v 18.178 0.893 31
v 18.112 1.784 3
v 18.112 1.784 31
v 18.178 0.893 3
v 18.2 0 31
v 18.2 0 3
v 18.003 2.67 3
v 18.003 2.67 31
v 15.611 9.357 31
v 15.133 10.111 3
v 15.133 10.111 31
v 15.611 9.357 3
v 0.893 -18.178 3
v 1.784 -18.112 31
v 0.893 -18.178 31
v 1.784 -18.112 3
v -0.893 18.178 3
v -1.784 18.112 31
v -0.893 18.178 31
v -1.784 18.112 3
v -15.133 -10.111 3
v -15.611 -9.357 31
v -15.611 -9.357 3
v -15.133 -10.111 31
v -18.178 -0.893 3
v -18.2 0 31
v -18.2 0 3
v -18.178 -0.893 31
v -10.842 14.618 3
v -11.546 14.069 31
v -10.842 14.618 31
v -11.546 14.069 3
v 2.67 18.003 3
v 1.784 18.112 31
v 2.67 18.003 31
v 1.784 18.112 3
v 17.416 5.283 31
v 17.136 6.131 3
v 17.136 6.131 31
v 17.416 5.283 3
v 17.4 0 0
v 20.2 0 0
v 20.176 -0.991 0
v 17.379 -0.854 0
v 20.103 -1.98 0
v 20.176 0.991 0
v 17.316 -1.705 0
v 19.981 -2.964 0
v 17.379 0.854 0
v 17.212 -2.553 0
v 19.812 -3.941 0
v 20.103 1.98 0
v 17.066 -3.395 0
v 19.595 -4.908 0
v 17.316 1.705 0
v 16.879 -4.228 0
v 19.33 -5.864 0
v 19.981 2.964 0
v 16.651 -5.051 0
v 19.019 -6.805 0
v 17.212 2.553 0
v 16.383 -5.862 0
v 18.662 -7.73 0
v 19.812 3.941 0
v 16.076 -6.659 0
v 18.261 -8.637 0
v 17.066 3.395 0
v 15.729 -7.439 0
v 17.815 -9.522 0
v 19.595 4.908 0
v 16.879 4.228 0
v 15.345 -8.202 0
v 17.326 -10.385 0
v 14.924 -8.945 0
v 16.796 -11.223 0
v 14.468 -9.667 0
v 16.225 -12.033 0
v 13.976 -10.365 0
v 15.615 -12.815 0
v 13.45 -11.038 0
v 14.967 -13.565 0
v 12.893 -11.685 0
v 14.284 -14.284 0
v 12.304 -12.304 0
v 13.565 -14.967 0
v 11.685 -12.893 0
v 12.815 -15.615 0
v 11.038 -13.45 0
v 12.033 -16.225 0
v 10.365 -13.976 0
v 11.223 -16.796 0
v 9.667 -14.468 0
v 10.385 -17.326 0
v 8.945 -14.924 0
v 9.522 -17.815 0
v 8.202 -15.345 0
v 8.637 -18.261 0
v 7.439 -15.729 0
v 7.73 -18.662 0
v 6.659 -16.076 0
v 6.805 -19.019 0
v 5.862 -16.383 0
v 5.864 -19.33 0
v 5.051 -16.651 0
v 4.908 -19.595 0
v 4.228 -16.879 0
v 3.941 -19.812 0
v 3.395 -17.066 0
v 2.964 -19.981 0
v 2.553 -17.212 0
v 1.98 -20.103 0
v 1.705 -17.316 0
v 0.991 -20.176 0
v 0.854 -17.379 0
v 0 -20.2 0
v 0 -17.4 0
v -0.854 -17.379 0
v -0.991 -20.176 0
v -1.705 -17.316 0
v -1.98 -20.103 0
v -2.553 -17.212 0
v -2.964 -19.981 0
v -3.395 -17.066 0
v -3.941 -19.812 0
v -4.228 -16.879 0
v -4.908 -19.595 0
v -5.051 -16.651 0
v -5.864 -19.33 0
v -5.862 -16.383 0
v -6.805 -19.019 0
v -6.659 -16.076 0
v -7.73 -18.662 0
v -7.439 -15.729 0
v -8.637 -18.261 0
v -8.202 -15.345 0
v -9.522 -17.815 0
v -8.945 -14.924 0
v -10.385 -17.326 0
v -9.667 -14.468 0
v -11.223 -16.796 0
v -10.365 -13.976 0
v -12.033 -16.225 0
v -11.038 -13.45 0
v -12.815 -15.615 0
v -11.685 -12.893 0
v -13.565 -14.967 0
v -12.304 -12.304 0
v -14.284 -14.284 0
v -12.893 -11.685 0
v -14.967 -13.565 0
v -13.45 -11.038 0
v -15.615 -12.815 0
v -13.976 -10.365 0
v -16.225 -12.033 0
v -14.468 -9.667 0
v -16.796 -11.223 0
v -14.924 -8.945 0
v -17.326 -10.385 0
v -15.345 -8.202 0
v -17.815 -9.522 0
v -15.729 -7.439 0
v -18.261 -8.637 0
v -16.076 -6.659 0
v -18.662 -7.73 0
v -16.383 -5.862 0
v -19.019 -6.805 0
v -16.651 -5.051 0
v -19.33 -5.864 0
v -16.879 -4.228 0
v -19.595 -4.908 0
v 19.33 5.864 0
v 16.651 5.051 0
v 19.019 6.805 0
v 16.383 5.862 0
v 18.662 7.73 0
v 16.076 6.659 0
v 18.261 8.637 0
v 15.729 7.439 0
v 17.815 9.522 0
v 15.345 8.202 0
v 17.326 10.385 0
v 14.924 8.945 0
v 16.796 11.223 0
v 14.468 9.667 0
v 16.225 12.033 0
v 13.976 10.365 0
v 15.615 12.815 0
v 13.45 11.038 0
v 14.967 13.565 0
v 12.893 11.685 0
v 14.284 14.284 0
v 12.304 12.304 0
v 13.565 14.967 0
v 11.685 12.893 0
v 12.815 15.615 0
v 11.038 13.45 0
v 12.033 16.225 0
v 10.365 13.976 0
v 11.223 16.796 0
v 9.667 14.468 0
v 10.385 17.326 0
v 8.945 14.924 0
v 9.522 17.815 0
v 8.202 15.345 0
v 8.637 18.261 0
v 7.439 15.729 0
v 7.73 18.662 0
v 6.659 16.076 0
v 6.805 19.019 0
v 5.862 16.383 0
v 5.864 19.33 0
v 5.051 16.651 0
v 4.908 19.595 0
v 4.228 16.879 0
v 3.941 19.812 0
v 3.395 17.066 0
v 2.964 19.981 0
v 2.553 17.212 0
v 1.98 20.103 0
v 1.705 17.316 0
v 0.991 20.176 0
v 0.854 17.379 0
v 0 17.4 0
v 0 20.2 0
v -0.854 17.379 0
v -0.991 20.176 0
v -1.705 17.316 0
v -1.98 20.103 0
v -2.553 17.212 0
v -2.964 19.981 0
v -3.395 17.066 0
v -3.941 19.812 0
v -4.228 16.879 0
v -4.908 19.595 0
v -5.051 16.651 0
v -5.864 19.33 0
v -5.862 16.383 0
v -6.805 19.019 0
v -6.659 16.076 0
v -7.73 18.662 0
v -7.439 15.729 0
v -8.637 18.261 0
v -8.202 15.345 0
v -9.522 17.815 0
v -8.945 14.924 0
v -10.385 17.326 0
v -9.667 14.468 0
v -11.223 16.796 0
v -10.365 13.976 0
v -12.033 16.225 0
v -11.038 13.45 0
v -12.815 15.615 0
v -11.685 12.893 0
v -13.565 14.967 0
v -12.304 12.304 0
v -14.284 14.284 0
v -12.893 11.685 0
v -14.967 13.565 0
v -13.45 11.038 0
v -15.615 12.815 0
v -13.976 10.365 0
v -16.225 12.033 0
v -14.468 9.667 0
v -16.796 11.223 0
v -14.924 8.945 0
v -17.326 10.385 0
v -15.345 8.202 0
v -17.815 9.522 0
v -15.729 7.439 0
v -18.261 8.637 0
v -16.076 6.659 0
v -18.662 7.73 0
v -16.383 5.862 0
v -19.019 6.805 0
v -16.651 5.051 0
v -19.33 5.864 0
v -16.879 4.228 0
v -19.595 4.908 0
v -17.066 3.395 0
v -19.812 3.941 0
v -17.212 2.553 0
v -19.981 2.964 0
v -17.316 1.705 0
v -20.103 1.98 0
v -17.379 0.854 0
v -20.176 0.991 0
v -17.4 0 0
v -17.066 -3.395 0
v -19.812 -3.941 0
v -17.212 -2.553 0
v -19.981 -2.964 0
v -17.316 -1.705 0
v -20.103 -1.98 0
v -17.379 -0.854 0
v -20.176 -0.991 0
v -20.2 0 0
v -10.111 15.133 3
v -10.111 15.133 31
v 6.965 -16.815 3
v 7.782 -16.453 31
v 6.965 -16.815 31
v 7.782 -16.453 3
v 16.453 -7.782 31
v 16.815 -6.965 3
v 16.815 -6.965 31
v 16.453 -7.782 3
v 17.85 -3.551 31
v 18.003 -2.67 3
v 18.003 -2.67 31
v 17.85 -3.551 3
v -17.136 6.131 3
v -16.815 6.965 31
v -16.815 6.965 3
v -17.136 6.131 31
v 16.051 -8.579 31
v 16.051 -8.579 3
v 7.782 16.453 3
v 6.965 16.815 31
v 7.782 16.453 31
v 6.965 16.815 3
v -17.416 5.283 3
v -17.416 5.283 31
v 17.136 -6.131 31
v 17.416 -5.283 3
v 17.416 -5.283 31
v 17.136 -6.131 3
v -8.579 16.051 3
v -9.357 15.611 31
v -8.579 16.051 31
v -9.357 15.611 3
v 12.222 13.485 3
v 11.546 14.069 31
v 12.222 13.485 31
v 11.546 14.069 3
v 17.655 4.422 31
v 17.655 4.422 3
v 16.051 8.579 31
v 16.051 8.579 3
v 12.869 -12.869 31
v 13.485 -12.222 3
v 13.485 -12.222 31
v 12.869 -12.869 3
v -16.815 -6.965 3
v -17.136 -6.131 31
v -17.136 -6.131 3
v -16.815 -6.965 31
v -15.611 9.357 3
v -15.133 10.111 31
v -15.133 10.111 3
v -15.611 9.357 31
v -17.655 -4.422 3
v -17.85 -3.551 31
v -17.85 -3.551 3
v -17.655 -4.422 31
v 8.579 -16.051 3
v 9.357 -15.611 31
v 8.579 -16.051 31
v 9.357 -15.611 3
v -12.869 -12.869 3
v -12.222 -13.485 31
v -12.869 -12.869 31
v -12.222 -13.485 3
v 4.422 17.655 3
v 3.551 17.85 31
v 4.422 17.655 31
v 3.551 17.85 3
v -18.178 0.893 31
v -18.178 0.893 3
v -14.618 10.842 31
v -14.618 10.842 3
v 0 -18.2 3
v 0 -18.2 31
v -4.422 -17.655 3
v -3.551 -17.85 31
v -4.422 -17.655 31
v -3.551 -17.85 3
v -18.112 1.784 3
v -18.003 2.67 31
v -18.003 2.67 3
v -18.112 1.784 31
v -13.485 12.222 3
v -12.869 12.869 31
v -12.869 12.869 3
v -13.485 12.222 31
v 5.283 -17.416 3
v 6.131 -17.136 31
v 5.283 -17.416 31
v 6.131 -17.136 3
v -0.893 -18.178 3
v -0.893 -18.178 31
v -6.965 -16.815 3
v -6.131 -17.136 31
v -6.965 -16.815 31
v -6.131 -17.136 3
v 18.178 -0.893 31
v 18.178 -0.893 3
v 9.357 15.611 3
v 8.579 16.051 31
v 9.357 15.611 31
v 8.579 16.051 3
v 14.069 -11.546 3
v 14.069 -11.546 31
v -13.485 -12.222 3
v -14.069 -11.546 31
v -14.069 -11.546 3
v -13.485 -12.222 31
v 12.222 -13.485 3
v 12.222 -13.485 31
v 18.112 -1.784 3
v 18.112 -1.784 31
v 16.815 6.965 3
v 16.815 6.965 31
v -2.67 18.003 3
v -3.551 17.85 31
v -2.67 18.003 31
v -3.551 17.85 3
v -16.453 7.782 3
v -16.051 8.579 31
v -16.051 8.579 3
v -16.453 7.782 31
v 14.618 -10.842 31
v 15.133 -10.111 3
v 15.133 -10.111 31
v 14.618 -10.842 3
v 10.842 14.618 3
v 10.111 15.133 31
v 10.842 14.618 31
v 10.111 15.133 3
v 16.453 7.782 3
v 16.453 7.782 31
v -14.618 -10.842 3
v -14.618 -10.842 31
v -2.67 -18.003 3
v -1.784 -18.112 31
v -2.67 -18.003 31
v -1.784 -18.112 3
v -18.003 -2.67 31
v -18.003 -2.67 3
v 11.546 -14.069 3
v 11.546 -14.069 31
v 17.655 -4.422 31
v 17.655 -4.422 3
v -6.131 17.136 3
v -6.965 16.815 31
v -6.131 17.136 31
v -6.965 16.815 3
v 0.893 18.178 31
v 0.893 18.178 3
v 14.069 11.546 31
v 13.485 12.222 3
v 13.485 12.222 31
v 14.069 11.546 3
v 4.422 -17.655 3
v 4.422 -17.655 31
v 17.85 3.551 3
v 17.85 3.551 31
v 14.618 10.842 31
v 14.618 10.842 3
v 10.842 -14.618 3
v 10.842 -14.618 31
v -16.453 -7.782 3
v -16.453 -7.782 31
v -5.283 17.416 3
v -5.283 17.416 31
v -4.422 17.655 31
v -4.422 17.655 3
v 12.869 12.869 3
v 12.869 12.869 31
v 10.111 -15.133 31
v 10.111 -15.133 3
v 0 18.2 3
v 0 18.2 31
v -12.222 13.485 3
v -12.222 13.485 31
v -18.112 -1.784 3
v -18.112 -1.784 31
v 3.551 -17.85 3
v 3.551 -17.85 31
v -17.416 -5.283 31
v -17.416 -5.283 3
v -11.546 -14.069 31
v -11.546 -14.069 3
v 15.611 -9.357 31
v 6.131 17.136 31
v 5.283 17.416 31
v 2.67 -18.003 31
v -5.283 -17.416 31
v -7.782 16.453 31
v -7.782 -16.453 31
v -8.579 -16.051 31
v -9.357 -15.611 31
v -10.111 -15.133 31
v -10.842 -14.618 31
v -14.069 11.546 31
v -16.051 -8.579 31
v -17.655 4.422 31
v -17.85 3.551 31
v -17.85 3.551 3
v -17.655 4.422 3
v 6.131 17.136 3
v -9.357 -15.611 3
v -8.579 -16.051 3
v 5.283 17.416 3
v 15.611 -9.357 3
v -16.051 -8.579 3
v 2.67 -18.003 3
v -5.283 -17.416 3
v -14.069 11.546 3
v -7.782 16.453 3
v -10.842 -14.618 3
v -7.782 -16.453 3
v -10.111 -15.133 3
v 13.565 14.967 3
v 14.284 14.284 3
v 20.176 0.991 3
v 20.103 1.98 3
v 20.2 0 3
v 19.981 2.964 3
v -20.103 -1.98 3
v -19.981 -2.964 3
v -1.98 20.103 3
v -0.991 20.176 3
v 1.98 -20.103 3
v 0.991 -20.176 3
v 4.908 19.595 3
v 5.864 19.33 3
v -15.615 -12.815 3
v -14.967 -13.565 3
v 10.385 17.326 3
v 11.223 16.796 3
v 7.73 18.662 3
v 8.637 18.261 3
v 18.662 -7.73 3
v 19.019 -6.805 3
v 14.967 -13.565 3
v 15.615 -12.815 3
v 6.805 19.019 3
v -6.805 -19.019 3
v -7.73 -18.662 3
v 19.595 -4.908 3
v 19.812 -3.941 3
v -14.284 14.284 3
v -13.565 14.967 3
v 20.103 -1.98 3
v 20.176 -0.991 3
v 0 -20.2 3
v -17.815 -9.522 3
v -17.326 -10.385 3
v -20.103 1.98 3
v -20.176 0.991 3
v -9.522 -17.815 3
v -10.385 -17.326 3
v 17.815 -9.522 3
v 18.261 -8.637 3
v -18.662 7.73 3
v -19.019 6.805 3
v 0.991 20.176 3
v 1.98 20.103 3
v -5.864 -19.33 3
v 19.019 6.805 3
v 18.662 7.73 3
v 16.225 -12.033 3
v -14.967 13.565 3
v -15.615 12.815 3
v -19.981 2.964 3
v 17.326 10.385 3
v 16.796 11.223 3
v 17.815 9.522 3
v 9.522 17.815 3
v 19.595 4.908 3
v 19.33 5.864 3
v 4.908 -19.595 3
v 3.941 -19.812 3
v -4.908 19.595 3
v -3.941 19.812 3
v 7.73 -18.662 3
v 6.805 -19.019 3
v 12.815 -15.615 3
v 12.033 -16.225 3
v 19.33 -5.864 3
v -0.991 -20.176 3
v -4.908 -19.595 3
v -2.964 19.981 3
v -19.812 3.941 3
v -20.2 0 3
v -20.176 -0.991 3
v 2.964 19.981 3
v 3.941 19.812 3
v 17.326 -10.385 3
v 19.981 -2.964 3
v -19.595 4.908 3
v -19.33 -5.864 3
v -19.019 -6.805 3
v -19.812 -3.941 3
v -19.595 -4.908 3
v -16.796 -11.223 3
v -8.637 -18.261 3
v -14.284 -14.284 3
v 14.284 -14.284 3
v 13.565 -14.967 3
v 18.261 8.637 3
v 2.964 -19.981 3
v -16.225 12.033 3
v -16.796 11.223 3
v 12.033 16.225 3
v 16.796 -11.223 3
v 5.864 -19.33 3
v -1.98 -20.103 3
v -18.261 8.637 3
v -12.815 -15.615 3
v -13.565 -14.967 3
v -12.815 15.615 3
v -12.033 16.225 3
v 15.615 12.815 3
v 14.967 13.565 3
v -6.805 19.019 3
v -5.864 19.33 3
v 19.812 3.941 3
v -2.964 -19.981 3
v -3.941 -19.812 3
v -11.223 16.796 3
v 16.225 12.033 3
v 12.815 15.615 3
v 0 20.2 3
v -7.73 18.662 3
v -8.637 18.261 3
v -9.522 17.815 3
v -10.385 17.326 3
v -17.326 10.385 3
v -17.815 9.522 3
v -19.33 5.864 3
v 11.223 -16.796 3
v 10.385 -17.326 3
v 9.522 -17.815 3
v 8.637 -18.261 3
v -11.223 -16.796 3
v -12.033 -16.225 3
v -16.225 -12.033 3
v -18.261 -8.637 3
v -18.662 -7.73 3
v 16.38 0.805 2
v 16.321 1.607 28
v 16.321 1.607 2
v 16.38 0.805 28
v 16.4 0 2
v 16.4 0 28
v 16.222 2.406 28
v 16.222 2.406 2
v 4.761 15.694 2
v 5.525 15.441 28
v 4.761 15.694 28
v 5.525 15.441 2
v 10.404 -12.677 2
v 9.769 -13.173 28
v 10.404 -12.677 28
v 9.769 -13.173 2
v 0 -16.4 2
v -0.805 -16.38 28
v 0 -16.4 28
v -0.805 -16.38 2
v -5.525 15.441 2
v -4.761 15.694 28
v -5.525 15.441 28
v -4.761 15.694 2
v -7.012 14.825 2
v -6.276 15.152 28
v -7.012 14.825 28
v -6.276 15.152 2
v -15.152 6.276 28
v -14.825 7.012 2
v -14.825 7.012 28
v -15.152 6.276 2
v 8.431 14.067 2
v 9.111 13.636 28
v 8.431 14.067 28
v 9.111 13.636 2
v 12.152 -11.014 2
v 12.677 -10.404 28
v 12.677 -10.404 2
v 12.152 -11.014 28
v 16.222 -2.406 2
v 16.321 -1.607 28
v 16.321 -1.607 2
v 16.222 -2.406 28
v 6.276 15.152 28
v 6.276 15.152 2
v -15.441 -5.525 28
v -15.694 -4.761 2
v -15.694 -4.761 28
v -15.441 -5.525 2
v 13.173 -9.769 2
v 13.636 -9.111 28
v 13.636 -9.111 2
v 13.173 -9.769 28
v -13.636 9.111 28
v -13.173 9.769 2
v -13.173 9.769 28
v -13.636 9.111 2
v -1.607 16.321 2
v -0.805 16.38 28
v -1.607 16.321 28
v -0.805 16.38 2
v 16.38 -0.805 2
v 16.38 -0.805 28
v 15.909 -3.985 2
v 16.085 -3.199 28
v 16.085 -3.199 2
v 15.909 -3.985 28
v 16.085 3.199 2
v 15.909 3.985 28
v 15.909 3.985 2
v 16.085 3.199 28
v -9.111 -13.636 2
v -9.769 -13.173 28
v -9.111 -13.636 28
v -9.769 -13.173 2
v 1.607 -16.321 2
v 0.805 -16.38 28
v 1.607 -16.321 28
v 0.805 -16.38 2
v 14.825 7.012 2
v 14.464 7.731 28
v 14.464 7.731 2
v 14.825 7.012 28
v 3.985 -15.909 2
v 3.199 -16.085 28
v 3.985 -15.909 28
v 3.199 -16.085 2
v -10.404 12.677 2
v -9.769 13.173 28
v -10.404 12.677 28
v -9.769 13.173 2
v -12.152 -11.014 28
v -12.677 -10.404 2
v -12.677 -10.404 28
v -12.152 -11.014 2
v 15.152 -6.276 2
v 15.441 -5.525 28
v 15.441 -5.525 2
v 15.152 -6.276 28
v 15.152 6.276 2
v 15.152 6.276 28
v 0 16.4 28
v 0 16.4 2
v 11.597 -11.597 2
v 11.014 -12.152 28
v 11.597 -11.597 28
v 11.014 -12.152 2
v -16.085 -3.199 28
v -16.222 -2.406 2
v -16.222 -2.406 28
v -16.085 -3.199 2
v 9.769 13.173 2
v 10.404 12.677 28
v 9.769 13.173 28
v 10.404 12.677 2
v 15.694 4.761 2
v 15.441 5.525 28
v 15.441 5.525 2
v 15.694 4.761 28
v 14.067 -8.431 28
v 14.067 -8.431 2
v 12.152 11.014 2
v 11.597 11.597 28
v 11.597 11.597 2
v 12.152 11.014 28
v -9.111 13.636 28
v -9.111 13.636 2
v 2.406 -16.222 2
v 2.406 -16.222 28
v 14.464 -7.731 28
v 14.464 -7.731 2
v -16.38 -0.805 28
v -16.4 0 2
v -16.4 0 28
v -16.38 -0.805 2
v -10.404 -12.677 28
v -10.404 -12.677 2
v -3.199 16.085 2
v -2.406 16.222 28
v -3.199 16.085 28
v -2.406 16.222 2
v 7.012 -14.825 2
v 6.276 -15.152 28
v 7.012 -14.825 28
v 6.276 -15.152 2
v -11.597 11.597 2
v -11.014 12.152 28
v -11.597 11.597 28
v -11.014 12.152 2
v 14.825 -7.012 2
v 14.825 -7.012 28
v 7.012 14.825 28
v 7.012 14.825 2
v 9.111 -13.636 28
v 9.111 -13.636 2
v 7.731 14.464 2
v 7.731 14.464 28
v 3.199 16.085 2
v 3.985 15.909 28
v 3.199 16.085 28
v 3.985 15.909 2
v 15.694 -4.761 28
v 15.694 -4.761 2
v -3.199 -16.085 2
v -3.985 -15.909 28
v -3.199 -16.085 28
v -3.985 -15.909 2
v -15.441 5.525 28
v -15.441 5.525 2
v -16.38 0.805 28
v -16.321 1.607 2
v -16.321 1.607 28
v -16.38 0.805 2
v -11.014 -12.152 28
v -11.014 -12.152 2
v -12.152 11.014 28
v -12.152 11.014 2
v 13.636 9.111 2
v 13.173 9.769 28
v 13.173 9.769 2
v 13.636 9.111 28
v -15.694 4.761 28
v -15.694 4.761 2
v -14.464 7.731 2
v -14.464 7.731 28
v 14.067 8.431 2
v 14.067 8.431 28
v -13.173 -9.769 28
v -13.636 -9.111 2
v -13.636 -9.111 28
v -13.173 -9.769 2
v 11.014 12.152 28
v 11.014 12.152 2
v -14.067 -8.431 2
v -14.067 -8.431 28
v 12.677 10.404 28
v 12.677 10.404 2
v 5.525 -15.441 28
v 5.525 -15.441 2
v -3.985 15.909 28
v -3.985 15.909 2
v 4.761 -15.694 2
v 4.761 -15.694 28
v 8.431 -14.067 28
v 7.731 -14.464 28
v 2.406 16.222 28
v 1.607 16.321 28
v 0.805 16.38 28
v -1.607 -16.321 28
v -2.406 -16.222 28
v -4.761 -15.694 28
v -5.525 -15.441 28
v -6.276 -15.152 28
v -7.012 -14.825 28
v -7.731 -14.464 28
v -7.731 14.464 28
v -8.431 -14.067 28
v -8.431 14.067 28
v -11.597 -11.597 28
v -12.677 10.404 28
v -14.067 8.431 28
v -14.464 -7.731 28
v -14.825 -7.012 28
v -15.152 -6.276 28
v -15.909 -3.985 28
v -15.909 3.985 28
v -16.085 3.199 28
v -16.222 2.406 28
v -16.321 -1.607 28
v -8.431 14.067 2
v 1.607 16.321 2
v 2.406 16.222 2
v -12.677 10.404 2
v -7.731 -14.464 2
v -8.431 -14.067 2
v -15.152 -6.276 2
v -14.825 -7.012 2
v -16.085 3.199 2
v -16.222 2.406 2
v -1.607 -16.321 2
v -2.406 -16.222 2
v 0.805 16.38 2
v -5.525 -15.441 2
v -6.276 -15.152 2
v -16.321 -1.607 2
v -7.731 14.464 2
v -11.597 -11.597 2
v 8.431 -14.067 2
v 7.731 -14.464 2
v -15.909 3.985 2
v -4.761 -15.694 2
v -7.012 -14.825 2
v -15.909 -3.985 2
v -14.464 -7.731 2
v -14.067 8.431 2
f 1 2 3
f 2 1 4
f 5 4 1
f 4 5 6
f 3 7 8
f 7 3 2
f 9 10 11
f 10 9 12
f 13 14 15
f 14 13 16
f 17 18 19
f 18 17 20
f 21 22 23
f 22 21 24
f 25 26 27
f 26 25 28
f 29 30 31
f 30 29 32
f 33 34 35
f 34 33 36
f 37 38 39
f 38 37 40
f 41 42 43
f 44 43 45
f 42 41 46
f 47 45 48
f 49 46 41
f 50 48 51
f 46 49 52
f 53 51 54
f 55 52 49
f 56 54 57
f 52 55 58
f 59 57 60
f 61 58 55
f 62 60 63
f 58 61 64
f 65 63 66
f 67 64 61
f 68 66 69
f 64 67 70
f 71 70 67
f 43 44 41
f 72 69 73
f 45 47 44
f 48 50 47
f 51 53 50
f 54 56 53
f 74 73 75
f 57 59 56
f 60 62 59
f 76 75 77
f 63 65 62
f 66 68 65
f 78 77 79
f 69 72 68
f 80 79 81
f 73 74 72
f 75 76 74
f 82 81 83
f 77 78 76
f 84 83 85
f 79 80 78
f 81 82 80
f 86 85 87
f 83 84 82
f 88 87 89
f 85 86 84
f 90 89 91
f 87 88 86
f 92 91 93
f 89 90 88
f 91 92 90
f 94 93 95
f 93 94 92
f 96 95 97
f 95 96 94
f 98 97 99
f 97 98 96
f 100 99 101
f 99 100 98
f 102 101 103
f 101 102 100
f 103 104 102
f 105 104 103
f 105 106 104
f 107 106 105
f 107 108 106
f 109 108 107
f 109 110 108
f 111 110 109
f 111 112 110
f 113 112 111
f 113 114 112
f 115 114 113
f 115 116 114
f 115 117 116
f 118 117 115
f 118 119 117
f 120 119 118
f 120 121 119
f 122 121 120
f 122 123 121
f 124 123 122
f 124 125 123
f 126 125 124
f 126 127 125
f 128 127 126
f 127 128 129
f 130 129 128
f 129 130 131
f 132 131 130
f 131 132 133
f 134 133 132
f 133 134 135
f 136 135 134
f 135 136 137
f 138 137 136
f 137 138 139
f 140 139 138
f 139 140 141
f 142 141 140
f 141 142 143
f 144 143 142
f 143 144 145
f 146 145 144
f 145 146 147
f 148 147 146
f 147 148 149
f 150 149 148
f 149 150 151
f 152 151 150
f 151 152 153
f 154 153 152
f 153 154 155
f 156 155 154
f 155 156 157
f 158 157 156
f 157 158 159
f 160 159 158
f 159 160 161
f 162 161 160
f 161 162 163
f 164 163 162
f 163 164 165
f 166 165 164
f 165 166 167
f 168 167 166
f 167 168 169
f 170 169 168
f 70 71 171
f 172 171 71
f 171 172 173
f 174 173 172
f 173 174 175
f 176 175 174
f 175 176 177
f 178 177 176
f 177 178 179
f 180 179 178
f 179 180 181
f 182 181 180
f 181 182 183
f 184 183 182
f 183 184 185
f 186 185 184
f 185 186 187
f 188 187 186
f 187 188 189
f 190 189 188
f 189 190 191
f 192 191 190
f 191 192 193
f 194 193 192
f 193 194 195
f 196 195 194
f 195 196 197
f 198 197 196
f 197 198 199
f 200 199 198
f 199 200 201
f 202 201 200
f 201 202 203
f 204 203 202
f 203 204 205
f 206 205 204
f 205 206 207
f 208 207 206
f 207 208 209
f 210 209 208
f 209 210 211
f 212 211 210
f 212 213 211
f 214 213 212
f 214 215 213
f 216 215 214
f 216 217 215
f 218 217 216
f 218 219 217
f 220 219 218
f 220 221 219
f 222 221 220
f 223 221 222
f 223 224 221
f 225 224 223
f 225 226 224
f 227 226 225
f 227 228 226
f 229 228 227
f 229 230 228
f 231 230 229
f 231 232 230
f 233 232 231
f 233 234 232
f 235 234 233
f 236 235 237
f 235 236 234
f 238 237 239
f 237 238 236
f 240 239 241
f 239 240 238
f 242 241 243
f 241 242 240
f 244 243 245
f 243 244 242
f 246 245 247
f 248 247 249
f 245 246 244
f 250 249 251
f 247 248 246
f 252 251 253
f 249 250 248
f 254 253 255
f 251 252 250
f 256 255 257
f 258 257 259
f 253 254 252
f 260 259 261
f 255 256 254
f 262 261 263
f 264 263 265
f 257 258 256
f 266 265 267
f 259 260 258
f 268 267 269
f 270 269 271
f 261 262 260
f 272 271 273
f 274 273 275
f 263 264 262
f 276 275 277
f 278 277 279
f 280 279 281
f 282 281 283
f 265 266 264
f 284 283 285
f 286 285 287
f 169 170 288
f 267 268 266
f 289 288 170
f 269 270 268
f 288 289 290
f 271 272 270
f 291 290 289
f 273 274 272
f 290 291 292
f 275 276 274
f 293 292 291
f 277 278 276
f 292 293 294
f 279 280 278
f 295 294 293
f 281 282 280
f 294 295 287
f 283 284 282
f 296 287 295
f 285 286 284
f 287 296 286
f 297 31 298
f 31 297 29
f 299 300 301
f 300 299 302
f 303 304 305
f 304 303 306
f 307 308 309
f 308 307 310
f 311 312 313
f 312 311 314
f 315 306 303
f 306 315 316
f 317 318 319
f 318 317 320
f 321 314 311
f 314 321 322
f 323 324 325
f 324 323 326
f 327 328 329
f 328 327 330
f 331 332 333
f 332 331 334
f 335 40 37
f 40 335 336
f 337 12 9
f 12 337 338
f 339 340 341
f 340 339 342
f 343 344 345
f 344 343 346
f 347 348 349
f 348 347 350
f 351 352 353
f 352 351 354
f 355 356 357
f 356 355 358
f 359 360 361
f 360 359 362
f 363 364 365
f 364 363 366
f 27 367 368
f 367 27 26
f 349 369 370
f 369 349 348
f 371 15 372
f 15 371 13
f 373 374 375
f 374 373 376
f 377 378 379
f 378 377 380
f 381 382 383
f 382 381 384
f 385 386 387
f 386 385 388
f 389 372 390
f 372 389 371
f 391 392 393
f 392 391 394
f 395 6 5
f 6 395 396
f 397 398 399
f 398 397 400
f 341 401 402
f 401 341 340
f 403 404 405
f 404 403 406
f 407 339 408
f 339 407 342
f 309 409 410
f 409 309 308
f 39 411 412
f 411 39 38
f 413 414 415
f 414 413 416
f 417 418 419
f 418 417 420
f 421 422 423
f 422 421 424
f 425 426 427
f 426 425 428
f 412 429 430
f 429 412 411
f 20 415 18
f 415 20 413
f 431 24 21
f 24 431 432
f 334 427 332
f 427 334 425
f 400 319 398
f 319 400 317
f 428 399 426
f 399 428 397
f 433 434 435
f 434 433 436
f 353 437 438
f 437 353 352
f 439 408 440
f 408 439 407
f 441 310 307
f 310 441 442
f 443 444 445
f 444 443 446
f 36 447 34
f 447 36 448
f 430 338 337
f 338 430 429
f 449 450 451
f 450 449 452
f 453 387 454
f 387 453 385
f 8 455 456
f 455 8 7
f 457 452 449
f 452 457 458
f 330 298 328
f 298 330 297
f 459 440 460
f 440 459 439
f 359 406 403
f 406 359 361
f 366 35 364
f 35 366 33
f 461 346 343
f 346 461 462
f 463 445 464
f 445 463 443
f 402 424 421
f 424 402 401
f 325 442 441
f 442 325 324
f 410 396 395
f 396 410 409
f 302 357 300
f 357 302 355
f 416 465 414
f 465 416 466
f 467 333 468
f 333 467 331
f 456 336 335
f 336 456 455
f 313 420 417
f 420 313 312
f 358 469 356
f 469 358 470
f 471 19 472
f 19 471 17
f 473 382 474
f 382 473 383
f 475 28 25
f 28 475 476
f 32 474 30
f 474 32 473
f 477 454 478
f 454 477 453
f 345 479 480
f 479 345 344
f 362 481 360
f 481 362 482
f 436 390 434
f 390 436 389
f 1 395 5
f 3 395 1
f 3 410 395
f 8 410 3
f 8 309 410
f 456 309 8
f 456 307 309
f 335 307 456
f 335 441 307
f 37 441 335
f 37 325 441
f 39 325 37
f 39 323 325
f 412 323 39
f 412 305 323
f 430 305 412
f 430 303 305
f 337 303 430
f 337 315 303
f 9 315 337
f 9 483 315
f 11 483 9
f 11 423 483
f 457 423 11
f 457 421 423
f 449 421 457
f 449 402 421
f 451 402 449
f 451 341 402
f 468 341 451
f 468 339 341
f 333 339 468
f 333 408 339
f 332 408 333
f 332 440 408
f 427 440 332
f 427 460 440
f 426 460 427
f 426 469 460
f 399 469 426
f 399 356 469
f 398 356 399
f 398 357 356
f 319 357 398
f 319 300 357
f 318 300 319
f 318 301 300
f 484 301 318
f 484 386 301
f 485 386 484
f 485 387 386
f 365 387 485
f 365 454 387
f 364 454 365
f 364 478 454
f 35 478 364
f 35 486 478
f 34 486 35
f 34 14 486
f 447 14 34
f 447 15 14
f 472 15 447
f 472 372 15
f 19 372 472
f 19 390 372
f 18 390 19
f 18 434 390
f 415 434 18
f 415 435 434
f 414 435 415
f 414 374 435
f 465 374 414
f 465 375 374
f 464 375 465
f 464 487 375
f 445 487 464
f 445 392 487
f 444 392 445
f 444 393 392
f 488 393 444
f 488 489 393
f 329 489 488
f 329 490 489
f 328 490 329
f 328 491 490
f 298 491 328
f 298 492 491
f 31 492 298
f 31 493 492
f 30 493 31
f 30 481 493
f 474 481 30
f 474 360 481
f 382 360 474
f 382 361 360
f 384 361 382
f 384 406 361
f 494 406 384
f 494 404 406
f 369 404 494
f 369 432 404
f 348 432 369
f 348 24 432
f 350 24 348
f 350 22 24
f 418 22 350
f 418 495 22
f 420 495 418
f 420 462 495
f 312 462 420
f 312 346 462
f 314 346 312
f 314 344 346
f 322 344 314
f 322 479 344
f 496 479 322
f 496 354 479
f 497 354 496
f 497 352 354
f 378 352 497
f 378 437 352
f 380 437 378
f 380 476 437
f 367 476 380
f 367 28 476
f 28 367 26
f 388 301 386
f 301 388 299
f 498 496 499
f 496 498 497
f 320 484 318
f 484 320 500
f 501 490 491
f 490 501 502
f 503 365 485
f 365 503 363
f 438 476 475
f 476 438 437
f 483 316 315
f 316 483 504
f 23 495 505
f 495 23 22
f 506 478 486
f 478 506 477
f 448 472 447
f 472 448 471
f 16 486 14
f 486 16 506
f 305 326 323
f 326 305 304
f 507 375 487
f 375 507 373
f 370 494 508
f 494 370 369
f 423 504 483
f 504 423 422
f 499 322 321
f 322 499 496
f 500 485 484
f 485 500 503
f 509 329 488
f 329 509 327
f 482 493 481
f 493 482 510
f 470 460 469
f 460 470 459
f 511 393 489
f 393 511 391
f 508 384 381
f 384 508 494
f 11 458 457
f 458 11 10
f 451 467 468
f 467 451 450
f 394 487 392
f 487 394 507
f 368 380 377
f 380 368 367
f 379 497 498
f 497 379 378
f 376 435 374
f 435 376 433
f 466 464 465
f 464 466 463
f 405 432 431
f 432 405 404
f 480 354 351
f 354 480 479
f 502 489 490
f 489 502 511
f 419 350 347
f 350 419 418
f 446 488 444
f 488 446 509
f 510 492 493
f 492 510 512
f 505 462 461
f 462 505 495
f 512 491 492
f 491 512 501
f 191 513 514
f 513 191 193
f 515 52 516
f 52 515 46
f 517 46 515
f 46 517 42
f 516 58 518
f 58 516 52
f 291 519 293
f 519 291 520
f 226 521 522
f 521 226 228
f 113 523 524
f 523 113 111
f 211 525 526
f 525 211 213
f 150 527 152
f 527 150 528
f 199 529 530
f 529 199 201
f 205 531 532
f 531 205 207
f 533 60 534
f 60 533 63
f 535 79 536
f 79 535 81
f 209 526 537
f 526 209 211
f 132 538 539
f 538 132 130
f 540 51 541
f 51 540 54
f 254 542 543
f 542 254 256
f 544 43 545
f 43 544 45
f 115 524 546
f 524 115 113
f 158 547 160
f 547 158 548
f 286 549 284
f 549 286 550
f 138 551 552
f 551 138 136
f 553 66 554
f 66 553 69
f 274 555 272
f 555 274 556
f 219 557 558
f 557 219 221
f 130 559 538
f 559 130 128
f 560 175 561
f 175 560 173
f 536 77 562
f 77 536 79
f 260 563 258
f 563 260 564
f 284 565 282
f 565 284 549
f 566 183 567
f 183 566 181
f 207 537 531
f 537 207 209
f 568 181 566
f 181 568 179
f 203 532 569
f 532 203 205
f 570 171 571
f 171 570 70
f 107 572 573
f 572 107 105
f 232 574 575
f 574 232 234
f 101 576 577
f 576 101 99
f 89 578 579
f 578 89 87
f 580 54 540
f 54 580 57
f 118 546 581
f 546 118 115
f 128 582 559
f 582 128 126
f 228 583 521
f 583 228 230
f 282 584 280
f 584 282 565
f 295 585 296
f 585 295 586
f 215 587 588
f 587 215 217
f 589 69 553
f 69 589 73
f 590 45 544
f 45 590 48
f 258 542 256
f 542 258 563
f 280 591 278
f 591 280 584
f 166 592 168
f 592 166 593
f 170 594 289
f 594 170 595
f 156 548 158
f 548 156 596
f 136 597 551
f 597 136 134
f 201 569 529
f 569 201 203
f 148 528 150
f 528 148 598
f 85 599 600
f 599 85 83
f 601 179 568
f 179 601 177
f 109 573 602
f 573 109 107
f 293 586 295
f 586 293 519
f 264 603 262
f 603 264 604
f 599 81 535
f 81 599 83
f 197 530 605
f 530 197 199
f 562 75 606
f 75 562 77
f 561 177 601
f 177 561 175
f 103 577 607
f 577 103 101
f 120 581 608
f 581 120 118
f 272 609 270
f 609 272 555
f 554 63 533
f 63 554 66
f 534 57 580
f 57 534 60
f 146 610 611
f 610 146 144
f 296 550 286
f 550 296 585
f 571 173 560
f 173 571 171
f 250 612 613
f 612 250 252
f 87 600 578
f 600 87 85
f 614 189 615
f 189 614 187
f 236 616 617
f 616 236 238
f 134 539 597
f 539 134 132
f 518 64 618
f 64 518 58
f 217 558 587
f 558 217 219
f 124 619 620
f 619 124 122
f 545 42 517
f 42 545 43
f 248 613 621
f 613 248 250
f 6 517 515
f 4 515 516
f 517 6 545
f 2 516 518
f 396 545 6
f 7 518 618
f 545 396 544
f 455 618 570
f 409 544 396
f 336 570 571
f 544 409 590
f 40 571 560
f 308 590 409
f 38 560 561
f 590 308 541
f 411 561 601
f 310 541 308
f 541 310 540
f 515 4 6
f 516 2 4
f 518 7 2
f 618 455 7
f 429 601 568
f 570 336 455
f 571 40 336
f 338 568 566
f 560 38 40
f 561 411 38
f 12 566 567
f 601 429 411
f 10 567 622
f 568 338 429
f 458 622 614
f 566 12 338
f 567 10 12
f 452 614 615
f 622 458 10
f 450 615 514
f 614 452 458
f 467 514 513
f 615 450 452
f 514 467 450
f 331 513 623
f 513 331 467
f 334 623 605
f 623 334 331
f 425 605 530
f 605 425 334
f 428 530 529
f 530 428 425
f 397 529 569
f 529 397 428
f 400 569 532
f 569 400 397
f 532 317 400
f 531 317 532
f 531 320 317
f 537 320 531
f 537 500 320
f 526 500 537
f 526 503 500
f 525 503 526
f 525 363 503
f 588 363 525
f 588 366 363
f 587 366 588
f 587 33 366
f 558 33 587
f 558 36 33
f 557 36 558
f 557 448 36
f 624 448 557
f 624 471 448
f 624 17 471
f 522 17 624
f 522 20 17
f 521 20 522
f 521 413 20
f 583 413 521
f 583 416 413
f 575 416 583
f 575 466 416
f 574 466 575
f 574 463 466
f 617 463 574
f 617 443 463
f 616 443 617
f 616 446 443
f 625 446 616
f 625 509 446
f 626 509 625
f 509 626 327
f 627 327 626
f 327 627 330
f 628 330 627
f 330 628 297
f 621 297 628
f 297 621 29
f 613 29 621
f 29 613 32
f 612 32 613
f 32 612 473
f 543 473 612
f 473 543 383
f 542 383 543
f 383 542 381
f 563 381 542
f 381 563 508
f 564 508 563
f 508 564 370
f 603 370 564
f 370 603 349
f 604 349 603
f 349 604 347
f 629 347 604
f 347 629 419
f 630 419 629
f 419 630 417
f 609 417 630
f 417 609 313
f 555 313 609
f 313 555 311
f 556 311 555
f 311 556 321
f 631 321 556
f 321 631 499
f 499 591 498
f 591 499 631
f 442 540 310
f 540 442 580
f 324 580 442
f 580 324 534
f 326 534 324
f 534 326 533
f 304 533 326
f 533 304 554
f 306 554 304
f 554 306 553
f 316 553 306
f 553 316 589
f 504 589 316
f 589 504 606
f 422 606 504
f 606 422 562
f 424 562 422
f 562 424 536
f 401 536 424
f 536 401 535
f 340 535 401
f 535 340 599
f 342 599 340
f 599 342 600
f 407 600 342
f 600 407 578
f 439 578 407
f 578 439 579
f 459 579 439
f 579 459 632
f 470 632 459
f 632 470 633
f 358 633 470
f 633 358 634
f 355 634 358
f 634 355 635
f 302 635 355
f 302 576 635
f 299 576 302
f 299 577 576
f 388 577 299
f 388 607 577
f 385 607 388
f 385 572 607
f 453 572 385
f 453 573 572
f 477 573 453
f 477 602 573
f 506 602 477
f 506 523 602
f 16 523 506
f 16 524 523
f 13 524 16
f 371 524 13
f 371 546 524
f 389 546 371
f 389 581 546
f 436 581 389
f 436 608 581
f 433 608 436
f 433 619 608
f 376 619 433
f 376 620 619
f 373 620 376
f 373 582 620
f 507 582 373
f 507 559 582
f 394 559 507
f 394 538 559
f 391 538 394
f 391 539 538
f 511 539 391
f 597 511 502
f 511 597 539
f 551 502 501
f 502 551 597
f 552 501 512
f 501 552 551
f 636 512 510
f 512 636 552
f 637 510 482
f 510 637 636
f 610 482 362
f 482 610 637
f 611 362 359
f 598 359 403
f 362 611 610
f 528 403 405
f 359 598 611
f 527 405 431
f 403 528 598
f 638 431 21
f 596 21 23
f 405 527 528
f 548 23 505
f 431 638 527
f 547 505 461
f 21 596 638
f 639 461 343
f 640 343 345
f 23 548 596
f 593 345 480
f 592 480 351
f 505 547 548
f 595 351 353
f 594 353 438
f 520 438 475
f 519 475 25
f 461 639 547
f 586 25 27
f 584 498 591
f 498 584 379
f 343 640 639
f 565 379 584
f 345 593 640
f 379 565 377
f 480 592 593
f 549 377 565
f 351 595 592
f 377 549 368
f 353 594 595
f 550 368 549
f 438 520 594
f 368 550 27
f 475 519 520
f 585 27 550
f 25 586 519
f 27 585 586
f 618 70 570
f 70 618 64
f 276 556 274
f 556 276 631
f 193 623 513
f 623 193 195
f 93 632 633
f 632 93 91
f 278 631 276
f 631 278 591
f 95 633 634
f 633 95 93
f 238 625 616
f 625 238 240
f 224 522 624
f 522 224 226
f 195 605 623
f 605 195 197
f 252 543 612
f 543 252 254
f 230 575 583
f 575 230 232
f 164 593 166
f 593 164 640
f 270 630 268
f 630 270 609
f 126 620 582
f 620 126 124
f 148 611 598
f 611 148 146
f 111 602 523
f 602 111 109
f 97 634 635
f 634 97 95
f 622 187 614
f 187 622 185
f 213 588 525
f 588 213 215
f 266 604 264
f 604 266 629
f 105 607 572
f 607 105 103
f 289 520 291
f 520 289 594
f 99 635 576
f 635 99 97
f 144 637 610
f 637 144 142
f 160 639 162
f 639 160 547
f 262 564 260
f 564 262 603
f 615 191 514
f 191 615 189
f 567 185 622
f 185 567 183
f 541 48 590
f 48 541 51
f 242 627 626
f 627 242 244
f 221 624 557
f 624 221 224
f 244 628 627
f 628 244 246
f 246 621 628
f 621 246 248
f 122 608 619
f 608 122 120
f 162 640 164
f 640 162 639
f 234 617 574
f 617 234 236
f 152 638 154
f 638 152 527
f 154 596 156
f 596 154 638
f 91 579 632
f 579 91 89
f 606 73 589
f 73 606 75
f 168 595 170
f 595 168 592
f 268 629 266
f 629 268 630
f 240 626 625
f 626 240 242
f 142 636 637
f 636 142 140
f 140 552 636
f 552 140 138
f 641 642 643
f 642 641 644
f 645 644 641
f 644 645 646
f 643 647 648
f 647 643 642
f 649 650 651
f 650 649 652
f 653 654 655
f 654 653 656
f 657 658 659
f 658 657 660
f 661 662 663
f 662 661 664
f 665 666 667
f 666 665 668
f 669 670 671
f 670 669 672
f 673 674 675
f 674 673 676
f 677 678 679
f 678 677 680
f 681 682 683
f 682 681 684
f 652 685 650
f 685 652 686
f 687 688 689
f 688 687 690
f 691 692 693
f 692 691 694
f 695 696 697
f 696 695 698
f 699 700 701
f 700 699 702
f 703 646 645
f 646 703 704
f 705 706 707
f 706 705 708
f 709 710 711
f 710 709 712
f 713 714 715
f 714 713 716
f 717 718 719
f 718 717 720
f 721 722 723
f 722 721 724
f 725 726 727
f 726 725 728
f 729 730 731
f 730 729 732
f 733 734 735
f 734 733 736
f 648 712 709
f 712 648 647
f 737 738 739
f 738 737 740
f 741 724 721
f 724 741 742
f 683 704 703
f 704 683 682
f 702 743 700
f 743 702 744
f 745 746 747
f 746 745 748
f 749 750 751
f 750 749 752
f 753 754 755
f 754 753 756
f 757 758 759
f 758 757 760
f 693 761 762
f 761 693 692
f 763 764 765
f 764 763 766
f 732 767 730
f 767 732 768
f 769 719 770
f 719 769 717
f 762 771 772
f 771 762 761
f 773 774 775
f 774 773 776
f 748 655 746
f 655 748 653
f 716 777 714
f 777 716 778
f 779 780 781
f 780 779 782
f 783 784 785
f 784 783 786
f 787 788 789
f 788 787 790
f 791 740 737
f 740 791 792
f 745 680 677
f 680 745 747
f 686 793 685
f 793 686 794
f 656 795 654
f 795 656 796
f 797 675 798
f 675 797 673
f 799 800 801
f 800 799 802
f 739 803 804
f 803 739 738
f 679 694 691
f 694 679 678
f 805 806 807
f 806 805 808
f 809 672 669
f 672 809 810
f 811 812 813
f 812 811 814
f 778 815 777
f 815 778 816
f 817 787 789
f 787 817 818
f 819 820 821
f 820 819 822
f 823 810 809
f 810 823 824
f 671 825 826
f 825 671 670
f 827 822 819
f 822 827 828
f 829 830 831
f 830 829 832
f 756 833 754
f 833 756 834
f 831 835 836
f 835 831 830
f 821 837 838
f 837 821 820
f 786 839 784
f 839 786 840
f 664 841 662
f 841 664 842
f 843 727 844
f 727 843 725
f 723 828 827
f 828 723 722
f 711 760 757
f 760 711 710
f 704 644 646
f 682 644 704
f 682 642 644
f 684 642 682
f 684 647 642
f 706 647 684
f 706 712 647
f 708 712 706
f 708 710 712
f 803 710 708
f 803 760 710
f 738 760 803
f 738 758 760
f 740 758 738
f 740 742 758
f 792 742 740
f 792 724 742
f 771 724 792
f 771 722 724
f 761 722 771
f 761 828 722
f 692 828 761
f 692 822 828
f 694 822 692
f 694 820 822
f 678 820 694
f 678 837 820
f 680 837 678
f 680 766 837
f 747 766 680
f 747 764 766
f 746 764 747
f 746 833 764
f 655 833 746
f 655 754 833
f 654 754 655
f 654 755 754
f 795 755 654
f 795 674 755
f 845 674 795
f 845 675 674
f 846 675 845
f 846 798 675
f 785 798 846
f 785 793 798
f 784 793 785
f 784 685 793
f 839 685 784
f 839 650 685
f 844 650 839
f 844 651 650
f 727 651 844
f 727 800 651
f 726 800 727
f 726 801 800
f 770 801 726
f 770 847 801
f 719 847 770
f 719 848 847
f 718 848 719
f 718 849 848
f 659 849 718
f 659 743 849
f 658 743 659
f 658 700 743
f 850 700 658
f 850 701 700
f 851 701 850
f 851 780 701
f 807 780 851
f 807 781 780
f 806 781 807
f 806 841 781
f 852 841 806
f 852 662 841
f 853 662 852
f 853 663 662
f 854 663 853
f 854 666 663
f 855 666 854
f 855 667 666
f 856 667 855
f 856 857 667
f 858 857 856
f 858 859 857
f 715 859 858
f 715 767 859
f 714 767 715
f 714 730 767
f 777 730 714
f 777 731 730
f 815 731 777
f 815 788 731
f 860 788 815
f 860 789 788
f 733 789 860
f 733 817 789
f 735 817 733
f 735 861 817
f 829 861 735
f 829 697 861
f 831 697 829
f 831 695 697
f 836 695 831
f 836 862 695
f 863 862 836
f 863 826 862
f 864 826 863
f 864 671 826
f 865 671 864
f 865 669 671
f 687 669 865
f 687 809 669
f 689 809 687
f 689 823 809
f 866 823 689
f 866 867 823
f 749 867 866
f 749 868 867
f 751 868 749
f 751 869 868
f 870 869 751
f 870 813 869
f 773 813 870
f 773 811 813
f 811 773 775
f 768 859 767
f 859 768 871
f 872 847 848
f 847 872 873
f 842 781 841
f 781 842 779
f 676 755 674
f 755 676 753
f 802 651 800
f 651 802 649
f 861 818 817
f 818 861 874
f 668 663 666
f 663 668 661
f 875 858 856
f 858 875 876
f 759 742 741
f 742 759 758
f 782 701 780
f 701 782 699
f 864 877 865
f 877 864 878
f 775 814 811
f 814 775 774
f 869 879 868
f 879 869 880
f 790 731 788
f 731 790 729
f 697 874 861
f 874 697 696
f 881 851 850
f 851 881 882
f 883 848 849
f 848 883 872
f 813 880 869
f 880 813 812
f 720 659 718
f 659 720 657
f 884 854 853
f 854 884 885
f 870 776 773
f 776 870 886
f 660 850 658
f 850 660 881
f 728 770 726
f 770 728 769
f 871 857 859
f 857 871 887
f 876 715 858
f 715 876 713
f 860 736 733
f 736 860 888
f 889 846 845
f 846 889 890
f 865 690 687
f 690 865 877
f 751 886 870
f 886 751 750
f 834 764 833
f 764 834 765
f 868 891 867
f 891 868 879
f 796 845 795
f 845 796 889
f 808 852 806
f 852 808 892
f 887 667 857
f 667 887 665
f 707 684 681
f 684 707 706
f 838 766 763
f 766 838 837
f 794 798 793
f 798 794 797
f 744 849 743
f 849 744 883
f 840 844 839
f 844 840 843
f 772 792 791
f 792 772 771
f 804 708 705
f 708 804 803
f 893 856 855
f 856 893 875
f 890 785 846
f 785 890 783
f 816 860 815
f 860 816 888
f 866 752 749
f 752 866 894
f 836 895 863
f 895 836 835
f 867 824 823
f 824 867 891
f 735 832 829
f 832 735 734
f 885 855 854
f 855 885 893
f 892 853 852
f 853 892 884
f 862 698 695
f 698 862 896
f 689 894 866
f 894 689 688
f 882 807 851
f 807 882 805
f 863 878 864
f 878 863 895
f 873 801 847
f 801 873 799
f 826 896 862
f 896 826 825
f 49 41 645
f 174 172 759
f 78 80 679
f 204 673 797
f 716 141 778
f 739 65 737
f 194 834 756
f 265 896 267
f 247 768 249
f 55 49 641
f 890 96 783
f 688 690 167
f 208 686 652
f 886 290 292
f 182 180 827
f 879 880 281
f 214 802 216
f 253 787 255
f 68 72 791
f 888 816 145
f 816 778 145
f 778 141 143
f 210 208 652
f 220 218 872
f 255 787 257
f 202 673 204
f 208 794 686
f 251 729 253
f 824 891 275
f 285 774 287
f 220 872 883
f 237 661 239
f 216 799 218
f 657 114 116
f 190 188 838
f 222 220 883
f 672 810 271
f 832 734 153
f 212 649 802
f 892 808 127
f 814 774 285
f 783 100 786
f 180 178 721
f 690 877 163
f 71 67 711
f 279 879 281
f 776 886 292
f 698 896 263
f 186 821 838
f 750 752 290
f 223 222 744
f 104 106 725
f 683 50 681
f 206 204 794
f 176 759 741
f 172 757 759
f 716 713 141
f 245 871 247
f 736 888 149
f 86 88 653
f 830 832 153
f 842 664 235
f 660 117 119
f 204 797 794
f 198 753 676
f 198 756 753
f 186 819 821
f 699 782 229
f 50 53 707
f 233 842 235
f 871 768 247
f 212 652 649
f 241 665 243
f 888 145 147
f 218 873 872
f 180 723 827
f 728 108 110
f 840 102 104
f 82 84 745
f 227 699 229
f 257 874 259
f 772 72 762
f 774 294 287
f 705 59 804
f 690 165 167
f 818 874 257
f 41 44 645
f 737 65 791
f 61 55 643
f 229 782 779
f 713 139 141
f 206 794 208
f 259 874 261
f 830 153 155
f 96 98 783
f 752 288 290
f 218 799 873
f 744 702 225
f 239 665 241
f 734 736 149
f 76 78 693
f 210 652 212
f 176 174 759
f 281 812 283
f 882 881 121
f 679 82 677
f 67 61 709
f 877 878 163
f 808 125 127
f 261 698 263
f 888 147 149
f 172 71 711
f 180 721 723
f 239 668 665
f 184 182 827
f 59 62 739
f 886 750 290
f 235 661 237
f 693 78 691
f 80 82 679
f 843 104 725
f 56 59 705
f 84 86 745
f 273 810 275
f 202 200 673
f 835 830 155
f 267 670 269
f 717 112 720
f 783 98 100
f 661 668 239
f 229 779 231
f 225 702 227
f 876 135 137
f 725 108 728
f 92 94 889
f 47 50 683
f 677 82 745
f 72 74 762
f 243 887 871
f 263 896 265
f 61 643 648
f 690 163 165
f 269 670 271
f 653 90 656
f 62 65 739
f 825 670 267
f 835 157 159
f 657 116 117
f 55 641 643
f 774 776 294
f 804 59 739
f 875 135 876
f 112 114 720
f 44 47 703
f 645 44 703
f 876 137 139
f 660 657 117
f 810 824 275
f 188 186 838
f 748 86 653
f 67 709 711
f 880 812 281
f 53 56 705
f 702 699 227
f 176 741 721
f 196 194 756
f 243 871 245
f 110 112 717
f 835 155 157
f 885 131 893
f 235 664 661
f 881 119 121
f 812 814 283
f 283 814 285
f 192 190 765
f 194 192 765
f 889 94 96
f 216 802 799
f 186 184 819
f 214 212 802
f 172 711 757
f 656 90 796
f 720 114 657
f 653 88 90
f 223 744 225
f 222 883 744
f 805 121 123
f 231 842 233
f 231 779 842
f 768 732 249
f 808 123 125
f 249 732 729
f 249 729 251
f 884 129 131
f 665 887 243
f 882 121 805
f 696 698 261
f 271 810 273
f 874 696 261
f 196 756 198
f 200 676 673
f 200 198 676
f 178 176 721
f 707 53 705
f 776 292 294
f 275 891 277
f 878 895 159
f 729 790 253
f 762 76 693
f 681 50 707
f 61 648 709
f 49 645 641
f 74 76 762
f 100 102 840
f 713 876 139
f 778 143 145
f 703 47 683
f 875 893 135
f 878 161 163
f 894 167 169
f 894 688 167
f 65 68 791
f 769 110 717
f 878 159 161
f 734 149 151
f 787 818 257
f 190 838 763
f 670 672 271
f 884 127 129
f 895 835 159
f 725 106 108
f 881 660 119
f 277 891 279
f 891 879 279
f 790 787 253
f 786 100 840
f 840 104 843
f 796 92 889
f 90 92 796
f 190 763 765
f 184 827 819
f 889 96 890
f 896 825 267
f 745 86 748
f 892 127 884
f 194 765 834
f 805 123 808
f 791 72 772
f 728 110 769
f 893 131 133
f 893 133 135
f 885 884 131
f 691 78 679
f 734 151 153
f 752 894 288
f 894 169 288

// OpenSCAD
$fn = 128;

// HT 32 cap (approximation)
// Typical HT pipe OD ~ 32 mm. Cap is a closed-end socket with a small outer lip.
pipe_od = 32.0;
wall = 2.2;

socket_depth = 28.0;      // insertion depth
end_thickness = 3.0;      // closed end thickness beyond socket
outer_lip = 2.0;          // extra radius at the open end
lip_height = 3.0;         // height of the outer lip

clearance = 0.4;          // radial clearance for fit

outer_d = pipe_od + 2*wall;
inner_d = pipe_od + 2*clearance;

cap_outer_d = outer_d + 2*outer_lip;

total_h = socket_depth + end_thickness;

module ht32_cap() {
    difference() {
        union() {
            // Main outer body (closed end)
            cylinder(d=outer_d, h=total_h);

            // Outer lip at open end
            translate([0,0,0])
                cylinder(d=cap_outer_d, h=lip_height);
        }

        // Inner cavity (open end), leaving closed end thickness
        translate([0,0,0])
            cylinder(d=inner_d, h=socket_depth);

        // Small inner lead-in chamfer (approximated by a short cone)
        chamfer_h = 2.0;
        translate([0,0,0])
            cylinder(d1=inner_d + 2.0, d2=inner_d, h=chamfer_h);
    }
}

ht32_cap();
